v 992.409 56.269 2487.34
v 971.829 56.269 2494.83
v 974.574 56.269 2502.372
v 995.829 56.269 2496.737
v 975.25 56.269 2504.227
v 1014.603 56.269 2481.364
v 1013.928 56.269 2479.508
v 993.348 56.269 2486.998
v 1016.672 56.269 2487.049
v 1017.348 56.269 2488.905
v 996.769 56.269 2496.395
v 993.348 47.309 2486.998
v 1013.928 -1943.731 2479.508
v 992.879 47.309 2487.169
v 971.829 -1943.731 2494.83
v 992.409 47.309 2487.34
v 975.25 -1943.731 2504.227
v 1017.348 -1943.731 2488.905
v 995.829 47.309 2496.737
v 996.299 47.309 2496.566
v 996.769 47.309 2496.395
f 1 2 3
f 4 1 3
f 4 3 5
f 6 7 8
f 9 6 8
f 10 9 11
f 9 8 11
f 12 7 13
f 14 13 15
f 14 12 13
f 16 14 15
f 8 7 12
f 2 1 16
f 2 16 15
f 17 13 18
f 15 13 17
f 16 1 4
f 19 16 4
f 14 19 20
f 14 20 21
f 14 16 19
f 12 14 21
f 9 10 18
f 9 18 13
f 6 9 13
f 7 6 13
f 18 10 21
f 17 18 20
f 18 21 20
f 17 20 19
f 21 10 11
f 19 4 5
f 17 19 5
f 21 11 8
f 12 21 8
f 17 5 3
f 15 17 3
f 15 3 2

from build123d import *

# Parameters (mm, degrees)
SKETCH_1_W          = 44.8
SKETCH_1_H          = 2000
EXTRUDE_1_DEPTH     = 10
CUT_EXTRUDE_2_DEPTH = 3329.04869605
EXTRUDE_2_DEPTH     = 44.8
CUT_EXTRUDE_3_DEPTH = 8.96


with BuildPart() as part:
    # 草图1 → 凸台-拉伸1 (new body)
    with BuildSketch(Plane(origin=(915.505475204, 0, 2515.33062051), x_dir=(-0.9396926207859093, 0, 0.3420201433256663), z_dir=(-0.3420201433256663, 0, -0.9396926207859093))):
        with Locations((-82.338659964, -943.731460395)):
            Rectangle(SKETCH_1_W, SKETCH_1_H)
    extrude(amount=-EXTRUDE_1_DEPTH)

    # 草图2 → 切除-拉伸2 (cut, through all)
    with BuildSketch(Plane(origin=(56.323916468, 0, -20.500229072), x_dir=(0.34202014332566644, 0, 0.9396926207859093), z_dir=(-0.9396926207859092, 0, 0.3420201433256664))):
        with BuildLine():
            Line((2678.733687242, 56.268539605), (2678.733687242, 49.653408924))
            Line((2678.733687242, 49.653408924), (2684.784186307, 49.653408924))
            ThreePointArc((2684.784186307, 49.653408924), (2684.783800485, 49.701723134), (2684.78264312, 49.750025021))
            Line((2684.78264312, 49.750025021), (2684.784186307, 56.268539605))
            Line((2684.784186307, 56.268539605), (2678.733687242, 56.268539605))
        make_face()
        with BuildLine():
            Line((2684.784186307, 49.653408924), (2678.733687242, 49.653408924))
            ThreePointArc((2678.733687242, 49.653408924), (2681.758936775, 46.628159392), (2684.784186307, 49.653408924))
        make_face()
    extrude(amount=-CUT_EXTRUDE_2_DEPTH, mode=Mode.SUBTRACT)

    # 草图3 → 凸台-拉伸2 (add)
    with BuildSketch(Plane(origin=(56.323916468, 0, -20.500229072), x_dir=(0.34202014332566644, 0, 0.9396926207859093), z_dir=(-0.9396926207859092, 0, 0.3420201433256664))):
        with BuildLine():
            Line((2678.733687242, 49.653408924), (2678.733687242, 56.268539605))
            Line((2678.733687242, 56.268539605), (2684.784186307, 56.268539605))
            Line((2684.784186307, 56.268539605), (2684.784186307, 49.653408924))
            ThreePointArc((2684.784186307, 49.653408924), (2681.758936775, 46.628159392), (2678.733687242, 49.653408924))
        make_face()
    extrude(amount=-EXTRUDE_2_DEPTH)

    # 草图4 → 切除-拉伸3 (cut)
    with BuildSketch(Plane(origin=(0, 56.268539605, 0), x_dir=(1, 0, 0), z_dir=(0, 1, 0))):
        Polygon((995.8288615, -2496.737076507), (996.29870781, -2496.566066436), (992.878506377, -2487.169140228), (992.408660067, -2487.340150299), align=None)
        Polygon((992.878506377, -2487.169140228), (996.29870781, -2496.566066436), (996.768554121, -2496.395056364), (993.348352687, -2486.998130156), align=None)
    extrude(amount=-CUT_EXTRUDE_3_DEPTH, mode=Mode.SUBTRACT)


solid = part.part
